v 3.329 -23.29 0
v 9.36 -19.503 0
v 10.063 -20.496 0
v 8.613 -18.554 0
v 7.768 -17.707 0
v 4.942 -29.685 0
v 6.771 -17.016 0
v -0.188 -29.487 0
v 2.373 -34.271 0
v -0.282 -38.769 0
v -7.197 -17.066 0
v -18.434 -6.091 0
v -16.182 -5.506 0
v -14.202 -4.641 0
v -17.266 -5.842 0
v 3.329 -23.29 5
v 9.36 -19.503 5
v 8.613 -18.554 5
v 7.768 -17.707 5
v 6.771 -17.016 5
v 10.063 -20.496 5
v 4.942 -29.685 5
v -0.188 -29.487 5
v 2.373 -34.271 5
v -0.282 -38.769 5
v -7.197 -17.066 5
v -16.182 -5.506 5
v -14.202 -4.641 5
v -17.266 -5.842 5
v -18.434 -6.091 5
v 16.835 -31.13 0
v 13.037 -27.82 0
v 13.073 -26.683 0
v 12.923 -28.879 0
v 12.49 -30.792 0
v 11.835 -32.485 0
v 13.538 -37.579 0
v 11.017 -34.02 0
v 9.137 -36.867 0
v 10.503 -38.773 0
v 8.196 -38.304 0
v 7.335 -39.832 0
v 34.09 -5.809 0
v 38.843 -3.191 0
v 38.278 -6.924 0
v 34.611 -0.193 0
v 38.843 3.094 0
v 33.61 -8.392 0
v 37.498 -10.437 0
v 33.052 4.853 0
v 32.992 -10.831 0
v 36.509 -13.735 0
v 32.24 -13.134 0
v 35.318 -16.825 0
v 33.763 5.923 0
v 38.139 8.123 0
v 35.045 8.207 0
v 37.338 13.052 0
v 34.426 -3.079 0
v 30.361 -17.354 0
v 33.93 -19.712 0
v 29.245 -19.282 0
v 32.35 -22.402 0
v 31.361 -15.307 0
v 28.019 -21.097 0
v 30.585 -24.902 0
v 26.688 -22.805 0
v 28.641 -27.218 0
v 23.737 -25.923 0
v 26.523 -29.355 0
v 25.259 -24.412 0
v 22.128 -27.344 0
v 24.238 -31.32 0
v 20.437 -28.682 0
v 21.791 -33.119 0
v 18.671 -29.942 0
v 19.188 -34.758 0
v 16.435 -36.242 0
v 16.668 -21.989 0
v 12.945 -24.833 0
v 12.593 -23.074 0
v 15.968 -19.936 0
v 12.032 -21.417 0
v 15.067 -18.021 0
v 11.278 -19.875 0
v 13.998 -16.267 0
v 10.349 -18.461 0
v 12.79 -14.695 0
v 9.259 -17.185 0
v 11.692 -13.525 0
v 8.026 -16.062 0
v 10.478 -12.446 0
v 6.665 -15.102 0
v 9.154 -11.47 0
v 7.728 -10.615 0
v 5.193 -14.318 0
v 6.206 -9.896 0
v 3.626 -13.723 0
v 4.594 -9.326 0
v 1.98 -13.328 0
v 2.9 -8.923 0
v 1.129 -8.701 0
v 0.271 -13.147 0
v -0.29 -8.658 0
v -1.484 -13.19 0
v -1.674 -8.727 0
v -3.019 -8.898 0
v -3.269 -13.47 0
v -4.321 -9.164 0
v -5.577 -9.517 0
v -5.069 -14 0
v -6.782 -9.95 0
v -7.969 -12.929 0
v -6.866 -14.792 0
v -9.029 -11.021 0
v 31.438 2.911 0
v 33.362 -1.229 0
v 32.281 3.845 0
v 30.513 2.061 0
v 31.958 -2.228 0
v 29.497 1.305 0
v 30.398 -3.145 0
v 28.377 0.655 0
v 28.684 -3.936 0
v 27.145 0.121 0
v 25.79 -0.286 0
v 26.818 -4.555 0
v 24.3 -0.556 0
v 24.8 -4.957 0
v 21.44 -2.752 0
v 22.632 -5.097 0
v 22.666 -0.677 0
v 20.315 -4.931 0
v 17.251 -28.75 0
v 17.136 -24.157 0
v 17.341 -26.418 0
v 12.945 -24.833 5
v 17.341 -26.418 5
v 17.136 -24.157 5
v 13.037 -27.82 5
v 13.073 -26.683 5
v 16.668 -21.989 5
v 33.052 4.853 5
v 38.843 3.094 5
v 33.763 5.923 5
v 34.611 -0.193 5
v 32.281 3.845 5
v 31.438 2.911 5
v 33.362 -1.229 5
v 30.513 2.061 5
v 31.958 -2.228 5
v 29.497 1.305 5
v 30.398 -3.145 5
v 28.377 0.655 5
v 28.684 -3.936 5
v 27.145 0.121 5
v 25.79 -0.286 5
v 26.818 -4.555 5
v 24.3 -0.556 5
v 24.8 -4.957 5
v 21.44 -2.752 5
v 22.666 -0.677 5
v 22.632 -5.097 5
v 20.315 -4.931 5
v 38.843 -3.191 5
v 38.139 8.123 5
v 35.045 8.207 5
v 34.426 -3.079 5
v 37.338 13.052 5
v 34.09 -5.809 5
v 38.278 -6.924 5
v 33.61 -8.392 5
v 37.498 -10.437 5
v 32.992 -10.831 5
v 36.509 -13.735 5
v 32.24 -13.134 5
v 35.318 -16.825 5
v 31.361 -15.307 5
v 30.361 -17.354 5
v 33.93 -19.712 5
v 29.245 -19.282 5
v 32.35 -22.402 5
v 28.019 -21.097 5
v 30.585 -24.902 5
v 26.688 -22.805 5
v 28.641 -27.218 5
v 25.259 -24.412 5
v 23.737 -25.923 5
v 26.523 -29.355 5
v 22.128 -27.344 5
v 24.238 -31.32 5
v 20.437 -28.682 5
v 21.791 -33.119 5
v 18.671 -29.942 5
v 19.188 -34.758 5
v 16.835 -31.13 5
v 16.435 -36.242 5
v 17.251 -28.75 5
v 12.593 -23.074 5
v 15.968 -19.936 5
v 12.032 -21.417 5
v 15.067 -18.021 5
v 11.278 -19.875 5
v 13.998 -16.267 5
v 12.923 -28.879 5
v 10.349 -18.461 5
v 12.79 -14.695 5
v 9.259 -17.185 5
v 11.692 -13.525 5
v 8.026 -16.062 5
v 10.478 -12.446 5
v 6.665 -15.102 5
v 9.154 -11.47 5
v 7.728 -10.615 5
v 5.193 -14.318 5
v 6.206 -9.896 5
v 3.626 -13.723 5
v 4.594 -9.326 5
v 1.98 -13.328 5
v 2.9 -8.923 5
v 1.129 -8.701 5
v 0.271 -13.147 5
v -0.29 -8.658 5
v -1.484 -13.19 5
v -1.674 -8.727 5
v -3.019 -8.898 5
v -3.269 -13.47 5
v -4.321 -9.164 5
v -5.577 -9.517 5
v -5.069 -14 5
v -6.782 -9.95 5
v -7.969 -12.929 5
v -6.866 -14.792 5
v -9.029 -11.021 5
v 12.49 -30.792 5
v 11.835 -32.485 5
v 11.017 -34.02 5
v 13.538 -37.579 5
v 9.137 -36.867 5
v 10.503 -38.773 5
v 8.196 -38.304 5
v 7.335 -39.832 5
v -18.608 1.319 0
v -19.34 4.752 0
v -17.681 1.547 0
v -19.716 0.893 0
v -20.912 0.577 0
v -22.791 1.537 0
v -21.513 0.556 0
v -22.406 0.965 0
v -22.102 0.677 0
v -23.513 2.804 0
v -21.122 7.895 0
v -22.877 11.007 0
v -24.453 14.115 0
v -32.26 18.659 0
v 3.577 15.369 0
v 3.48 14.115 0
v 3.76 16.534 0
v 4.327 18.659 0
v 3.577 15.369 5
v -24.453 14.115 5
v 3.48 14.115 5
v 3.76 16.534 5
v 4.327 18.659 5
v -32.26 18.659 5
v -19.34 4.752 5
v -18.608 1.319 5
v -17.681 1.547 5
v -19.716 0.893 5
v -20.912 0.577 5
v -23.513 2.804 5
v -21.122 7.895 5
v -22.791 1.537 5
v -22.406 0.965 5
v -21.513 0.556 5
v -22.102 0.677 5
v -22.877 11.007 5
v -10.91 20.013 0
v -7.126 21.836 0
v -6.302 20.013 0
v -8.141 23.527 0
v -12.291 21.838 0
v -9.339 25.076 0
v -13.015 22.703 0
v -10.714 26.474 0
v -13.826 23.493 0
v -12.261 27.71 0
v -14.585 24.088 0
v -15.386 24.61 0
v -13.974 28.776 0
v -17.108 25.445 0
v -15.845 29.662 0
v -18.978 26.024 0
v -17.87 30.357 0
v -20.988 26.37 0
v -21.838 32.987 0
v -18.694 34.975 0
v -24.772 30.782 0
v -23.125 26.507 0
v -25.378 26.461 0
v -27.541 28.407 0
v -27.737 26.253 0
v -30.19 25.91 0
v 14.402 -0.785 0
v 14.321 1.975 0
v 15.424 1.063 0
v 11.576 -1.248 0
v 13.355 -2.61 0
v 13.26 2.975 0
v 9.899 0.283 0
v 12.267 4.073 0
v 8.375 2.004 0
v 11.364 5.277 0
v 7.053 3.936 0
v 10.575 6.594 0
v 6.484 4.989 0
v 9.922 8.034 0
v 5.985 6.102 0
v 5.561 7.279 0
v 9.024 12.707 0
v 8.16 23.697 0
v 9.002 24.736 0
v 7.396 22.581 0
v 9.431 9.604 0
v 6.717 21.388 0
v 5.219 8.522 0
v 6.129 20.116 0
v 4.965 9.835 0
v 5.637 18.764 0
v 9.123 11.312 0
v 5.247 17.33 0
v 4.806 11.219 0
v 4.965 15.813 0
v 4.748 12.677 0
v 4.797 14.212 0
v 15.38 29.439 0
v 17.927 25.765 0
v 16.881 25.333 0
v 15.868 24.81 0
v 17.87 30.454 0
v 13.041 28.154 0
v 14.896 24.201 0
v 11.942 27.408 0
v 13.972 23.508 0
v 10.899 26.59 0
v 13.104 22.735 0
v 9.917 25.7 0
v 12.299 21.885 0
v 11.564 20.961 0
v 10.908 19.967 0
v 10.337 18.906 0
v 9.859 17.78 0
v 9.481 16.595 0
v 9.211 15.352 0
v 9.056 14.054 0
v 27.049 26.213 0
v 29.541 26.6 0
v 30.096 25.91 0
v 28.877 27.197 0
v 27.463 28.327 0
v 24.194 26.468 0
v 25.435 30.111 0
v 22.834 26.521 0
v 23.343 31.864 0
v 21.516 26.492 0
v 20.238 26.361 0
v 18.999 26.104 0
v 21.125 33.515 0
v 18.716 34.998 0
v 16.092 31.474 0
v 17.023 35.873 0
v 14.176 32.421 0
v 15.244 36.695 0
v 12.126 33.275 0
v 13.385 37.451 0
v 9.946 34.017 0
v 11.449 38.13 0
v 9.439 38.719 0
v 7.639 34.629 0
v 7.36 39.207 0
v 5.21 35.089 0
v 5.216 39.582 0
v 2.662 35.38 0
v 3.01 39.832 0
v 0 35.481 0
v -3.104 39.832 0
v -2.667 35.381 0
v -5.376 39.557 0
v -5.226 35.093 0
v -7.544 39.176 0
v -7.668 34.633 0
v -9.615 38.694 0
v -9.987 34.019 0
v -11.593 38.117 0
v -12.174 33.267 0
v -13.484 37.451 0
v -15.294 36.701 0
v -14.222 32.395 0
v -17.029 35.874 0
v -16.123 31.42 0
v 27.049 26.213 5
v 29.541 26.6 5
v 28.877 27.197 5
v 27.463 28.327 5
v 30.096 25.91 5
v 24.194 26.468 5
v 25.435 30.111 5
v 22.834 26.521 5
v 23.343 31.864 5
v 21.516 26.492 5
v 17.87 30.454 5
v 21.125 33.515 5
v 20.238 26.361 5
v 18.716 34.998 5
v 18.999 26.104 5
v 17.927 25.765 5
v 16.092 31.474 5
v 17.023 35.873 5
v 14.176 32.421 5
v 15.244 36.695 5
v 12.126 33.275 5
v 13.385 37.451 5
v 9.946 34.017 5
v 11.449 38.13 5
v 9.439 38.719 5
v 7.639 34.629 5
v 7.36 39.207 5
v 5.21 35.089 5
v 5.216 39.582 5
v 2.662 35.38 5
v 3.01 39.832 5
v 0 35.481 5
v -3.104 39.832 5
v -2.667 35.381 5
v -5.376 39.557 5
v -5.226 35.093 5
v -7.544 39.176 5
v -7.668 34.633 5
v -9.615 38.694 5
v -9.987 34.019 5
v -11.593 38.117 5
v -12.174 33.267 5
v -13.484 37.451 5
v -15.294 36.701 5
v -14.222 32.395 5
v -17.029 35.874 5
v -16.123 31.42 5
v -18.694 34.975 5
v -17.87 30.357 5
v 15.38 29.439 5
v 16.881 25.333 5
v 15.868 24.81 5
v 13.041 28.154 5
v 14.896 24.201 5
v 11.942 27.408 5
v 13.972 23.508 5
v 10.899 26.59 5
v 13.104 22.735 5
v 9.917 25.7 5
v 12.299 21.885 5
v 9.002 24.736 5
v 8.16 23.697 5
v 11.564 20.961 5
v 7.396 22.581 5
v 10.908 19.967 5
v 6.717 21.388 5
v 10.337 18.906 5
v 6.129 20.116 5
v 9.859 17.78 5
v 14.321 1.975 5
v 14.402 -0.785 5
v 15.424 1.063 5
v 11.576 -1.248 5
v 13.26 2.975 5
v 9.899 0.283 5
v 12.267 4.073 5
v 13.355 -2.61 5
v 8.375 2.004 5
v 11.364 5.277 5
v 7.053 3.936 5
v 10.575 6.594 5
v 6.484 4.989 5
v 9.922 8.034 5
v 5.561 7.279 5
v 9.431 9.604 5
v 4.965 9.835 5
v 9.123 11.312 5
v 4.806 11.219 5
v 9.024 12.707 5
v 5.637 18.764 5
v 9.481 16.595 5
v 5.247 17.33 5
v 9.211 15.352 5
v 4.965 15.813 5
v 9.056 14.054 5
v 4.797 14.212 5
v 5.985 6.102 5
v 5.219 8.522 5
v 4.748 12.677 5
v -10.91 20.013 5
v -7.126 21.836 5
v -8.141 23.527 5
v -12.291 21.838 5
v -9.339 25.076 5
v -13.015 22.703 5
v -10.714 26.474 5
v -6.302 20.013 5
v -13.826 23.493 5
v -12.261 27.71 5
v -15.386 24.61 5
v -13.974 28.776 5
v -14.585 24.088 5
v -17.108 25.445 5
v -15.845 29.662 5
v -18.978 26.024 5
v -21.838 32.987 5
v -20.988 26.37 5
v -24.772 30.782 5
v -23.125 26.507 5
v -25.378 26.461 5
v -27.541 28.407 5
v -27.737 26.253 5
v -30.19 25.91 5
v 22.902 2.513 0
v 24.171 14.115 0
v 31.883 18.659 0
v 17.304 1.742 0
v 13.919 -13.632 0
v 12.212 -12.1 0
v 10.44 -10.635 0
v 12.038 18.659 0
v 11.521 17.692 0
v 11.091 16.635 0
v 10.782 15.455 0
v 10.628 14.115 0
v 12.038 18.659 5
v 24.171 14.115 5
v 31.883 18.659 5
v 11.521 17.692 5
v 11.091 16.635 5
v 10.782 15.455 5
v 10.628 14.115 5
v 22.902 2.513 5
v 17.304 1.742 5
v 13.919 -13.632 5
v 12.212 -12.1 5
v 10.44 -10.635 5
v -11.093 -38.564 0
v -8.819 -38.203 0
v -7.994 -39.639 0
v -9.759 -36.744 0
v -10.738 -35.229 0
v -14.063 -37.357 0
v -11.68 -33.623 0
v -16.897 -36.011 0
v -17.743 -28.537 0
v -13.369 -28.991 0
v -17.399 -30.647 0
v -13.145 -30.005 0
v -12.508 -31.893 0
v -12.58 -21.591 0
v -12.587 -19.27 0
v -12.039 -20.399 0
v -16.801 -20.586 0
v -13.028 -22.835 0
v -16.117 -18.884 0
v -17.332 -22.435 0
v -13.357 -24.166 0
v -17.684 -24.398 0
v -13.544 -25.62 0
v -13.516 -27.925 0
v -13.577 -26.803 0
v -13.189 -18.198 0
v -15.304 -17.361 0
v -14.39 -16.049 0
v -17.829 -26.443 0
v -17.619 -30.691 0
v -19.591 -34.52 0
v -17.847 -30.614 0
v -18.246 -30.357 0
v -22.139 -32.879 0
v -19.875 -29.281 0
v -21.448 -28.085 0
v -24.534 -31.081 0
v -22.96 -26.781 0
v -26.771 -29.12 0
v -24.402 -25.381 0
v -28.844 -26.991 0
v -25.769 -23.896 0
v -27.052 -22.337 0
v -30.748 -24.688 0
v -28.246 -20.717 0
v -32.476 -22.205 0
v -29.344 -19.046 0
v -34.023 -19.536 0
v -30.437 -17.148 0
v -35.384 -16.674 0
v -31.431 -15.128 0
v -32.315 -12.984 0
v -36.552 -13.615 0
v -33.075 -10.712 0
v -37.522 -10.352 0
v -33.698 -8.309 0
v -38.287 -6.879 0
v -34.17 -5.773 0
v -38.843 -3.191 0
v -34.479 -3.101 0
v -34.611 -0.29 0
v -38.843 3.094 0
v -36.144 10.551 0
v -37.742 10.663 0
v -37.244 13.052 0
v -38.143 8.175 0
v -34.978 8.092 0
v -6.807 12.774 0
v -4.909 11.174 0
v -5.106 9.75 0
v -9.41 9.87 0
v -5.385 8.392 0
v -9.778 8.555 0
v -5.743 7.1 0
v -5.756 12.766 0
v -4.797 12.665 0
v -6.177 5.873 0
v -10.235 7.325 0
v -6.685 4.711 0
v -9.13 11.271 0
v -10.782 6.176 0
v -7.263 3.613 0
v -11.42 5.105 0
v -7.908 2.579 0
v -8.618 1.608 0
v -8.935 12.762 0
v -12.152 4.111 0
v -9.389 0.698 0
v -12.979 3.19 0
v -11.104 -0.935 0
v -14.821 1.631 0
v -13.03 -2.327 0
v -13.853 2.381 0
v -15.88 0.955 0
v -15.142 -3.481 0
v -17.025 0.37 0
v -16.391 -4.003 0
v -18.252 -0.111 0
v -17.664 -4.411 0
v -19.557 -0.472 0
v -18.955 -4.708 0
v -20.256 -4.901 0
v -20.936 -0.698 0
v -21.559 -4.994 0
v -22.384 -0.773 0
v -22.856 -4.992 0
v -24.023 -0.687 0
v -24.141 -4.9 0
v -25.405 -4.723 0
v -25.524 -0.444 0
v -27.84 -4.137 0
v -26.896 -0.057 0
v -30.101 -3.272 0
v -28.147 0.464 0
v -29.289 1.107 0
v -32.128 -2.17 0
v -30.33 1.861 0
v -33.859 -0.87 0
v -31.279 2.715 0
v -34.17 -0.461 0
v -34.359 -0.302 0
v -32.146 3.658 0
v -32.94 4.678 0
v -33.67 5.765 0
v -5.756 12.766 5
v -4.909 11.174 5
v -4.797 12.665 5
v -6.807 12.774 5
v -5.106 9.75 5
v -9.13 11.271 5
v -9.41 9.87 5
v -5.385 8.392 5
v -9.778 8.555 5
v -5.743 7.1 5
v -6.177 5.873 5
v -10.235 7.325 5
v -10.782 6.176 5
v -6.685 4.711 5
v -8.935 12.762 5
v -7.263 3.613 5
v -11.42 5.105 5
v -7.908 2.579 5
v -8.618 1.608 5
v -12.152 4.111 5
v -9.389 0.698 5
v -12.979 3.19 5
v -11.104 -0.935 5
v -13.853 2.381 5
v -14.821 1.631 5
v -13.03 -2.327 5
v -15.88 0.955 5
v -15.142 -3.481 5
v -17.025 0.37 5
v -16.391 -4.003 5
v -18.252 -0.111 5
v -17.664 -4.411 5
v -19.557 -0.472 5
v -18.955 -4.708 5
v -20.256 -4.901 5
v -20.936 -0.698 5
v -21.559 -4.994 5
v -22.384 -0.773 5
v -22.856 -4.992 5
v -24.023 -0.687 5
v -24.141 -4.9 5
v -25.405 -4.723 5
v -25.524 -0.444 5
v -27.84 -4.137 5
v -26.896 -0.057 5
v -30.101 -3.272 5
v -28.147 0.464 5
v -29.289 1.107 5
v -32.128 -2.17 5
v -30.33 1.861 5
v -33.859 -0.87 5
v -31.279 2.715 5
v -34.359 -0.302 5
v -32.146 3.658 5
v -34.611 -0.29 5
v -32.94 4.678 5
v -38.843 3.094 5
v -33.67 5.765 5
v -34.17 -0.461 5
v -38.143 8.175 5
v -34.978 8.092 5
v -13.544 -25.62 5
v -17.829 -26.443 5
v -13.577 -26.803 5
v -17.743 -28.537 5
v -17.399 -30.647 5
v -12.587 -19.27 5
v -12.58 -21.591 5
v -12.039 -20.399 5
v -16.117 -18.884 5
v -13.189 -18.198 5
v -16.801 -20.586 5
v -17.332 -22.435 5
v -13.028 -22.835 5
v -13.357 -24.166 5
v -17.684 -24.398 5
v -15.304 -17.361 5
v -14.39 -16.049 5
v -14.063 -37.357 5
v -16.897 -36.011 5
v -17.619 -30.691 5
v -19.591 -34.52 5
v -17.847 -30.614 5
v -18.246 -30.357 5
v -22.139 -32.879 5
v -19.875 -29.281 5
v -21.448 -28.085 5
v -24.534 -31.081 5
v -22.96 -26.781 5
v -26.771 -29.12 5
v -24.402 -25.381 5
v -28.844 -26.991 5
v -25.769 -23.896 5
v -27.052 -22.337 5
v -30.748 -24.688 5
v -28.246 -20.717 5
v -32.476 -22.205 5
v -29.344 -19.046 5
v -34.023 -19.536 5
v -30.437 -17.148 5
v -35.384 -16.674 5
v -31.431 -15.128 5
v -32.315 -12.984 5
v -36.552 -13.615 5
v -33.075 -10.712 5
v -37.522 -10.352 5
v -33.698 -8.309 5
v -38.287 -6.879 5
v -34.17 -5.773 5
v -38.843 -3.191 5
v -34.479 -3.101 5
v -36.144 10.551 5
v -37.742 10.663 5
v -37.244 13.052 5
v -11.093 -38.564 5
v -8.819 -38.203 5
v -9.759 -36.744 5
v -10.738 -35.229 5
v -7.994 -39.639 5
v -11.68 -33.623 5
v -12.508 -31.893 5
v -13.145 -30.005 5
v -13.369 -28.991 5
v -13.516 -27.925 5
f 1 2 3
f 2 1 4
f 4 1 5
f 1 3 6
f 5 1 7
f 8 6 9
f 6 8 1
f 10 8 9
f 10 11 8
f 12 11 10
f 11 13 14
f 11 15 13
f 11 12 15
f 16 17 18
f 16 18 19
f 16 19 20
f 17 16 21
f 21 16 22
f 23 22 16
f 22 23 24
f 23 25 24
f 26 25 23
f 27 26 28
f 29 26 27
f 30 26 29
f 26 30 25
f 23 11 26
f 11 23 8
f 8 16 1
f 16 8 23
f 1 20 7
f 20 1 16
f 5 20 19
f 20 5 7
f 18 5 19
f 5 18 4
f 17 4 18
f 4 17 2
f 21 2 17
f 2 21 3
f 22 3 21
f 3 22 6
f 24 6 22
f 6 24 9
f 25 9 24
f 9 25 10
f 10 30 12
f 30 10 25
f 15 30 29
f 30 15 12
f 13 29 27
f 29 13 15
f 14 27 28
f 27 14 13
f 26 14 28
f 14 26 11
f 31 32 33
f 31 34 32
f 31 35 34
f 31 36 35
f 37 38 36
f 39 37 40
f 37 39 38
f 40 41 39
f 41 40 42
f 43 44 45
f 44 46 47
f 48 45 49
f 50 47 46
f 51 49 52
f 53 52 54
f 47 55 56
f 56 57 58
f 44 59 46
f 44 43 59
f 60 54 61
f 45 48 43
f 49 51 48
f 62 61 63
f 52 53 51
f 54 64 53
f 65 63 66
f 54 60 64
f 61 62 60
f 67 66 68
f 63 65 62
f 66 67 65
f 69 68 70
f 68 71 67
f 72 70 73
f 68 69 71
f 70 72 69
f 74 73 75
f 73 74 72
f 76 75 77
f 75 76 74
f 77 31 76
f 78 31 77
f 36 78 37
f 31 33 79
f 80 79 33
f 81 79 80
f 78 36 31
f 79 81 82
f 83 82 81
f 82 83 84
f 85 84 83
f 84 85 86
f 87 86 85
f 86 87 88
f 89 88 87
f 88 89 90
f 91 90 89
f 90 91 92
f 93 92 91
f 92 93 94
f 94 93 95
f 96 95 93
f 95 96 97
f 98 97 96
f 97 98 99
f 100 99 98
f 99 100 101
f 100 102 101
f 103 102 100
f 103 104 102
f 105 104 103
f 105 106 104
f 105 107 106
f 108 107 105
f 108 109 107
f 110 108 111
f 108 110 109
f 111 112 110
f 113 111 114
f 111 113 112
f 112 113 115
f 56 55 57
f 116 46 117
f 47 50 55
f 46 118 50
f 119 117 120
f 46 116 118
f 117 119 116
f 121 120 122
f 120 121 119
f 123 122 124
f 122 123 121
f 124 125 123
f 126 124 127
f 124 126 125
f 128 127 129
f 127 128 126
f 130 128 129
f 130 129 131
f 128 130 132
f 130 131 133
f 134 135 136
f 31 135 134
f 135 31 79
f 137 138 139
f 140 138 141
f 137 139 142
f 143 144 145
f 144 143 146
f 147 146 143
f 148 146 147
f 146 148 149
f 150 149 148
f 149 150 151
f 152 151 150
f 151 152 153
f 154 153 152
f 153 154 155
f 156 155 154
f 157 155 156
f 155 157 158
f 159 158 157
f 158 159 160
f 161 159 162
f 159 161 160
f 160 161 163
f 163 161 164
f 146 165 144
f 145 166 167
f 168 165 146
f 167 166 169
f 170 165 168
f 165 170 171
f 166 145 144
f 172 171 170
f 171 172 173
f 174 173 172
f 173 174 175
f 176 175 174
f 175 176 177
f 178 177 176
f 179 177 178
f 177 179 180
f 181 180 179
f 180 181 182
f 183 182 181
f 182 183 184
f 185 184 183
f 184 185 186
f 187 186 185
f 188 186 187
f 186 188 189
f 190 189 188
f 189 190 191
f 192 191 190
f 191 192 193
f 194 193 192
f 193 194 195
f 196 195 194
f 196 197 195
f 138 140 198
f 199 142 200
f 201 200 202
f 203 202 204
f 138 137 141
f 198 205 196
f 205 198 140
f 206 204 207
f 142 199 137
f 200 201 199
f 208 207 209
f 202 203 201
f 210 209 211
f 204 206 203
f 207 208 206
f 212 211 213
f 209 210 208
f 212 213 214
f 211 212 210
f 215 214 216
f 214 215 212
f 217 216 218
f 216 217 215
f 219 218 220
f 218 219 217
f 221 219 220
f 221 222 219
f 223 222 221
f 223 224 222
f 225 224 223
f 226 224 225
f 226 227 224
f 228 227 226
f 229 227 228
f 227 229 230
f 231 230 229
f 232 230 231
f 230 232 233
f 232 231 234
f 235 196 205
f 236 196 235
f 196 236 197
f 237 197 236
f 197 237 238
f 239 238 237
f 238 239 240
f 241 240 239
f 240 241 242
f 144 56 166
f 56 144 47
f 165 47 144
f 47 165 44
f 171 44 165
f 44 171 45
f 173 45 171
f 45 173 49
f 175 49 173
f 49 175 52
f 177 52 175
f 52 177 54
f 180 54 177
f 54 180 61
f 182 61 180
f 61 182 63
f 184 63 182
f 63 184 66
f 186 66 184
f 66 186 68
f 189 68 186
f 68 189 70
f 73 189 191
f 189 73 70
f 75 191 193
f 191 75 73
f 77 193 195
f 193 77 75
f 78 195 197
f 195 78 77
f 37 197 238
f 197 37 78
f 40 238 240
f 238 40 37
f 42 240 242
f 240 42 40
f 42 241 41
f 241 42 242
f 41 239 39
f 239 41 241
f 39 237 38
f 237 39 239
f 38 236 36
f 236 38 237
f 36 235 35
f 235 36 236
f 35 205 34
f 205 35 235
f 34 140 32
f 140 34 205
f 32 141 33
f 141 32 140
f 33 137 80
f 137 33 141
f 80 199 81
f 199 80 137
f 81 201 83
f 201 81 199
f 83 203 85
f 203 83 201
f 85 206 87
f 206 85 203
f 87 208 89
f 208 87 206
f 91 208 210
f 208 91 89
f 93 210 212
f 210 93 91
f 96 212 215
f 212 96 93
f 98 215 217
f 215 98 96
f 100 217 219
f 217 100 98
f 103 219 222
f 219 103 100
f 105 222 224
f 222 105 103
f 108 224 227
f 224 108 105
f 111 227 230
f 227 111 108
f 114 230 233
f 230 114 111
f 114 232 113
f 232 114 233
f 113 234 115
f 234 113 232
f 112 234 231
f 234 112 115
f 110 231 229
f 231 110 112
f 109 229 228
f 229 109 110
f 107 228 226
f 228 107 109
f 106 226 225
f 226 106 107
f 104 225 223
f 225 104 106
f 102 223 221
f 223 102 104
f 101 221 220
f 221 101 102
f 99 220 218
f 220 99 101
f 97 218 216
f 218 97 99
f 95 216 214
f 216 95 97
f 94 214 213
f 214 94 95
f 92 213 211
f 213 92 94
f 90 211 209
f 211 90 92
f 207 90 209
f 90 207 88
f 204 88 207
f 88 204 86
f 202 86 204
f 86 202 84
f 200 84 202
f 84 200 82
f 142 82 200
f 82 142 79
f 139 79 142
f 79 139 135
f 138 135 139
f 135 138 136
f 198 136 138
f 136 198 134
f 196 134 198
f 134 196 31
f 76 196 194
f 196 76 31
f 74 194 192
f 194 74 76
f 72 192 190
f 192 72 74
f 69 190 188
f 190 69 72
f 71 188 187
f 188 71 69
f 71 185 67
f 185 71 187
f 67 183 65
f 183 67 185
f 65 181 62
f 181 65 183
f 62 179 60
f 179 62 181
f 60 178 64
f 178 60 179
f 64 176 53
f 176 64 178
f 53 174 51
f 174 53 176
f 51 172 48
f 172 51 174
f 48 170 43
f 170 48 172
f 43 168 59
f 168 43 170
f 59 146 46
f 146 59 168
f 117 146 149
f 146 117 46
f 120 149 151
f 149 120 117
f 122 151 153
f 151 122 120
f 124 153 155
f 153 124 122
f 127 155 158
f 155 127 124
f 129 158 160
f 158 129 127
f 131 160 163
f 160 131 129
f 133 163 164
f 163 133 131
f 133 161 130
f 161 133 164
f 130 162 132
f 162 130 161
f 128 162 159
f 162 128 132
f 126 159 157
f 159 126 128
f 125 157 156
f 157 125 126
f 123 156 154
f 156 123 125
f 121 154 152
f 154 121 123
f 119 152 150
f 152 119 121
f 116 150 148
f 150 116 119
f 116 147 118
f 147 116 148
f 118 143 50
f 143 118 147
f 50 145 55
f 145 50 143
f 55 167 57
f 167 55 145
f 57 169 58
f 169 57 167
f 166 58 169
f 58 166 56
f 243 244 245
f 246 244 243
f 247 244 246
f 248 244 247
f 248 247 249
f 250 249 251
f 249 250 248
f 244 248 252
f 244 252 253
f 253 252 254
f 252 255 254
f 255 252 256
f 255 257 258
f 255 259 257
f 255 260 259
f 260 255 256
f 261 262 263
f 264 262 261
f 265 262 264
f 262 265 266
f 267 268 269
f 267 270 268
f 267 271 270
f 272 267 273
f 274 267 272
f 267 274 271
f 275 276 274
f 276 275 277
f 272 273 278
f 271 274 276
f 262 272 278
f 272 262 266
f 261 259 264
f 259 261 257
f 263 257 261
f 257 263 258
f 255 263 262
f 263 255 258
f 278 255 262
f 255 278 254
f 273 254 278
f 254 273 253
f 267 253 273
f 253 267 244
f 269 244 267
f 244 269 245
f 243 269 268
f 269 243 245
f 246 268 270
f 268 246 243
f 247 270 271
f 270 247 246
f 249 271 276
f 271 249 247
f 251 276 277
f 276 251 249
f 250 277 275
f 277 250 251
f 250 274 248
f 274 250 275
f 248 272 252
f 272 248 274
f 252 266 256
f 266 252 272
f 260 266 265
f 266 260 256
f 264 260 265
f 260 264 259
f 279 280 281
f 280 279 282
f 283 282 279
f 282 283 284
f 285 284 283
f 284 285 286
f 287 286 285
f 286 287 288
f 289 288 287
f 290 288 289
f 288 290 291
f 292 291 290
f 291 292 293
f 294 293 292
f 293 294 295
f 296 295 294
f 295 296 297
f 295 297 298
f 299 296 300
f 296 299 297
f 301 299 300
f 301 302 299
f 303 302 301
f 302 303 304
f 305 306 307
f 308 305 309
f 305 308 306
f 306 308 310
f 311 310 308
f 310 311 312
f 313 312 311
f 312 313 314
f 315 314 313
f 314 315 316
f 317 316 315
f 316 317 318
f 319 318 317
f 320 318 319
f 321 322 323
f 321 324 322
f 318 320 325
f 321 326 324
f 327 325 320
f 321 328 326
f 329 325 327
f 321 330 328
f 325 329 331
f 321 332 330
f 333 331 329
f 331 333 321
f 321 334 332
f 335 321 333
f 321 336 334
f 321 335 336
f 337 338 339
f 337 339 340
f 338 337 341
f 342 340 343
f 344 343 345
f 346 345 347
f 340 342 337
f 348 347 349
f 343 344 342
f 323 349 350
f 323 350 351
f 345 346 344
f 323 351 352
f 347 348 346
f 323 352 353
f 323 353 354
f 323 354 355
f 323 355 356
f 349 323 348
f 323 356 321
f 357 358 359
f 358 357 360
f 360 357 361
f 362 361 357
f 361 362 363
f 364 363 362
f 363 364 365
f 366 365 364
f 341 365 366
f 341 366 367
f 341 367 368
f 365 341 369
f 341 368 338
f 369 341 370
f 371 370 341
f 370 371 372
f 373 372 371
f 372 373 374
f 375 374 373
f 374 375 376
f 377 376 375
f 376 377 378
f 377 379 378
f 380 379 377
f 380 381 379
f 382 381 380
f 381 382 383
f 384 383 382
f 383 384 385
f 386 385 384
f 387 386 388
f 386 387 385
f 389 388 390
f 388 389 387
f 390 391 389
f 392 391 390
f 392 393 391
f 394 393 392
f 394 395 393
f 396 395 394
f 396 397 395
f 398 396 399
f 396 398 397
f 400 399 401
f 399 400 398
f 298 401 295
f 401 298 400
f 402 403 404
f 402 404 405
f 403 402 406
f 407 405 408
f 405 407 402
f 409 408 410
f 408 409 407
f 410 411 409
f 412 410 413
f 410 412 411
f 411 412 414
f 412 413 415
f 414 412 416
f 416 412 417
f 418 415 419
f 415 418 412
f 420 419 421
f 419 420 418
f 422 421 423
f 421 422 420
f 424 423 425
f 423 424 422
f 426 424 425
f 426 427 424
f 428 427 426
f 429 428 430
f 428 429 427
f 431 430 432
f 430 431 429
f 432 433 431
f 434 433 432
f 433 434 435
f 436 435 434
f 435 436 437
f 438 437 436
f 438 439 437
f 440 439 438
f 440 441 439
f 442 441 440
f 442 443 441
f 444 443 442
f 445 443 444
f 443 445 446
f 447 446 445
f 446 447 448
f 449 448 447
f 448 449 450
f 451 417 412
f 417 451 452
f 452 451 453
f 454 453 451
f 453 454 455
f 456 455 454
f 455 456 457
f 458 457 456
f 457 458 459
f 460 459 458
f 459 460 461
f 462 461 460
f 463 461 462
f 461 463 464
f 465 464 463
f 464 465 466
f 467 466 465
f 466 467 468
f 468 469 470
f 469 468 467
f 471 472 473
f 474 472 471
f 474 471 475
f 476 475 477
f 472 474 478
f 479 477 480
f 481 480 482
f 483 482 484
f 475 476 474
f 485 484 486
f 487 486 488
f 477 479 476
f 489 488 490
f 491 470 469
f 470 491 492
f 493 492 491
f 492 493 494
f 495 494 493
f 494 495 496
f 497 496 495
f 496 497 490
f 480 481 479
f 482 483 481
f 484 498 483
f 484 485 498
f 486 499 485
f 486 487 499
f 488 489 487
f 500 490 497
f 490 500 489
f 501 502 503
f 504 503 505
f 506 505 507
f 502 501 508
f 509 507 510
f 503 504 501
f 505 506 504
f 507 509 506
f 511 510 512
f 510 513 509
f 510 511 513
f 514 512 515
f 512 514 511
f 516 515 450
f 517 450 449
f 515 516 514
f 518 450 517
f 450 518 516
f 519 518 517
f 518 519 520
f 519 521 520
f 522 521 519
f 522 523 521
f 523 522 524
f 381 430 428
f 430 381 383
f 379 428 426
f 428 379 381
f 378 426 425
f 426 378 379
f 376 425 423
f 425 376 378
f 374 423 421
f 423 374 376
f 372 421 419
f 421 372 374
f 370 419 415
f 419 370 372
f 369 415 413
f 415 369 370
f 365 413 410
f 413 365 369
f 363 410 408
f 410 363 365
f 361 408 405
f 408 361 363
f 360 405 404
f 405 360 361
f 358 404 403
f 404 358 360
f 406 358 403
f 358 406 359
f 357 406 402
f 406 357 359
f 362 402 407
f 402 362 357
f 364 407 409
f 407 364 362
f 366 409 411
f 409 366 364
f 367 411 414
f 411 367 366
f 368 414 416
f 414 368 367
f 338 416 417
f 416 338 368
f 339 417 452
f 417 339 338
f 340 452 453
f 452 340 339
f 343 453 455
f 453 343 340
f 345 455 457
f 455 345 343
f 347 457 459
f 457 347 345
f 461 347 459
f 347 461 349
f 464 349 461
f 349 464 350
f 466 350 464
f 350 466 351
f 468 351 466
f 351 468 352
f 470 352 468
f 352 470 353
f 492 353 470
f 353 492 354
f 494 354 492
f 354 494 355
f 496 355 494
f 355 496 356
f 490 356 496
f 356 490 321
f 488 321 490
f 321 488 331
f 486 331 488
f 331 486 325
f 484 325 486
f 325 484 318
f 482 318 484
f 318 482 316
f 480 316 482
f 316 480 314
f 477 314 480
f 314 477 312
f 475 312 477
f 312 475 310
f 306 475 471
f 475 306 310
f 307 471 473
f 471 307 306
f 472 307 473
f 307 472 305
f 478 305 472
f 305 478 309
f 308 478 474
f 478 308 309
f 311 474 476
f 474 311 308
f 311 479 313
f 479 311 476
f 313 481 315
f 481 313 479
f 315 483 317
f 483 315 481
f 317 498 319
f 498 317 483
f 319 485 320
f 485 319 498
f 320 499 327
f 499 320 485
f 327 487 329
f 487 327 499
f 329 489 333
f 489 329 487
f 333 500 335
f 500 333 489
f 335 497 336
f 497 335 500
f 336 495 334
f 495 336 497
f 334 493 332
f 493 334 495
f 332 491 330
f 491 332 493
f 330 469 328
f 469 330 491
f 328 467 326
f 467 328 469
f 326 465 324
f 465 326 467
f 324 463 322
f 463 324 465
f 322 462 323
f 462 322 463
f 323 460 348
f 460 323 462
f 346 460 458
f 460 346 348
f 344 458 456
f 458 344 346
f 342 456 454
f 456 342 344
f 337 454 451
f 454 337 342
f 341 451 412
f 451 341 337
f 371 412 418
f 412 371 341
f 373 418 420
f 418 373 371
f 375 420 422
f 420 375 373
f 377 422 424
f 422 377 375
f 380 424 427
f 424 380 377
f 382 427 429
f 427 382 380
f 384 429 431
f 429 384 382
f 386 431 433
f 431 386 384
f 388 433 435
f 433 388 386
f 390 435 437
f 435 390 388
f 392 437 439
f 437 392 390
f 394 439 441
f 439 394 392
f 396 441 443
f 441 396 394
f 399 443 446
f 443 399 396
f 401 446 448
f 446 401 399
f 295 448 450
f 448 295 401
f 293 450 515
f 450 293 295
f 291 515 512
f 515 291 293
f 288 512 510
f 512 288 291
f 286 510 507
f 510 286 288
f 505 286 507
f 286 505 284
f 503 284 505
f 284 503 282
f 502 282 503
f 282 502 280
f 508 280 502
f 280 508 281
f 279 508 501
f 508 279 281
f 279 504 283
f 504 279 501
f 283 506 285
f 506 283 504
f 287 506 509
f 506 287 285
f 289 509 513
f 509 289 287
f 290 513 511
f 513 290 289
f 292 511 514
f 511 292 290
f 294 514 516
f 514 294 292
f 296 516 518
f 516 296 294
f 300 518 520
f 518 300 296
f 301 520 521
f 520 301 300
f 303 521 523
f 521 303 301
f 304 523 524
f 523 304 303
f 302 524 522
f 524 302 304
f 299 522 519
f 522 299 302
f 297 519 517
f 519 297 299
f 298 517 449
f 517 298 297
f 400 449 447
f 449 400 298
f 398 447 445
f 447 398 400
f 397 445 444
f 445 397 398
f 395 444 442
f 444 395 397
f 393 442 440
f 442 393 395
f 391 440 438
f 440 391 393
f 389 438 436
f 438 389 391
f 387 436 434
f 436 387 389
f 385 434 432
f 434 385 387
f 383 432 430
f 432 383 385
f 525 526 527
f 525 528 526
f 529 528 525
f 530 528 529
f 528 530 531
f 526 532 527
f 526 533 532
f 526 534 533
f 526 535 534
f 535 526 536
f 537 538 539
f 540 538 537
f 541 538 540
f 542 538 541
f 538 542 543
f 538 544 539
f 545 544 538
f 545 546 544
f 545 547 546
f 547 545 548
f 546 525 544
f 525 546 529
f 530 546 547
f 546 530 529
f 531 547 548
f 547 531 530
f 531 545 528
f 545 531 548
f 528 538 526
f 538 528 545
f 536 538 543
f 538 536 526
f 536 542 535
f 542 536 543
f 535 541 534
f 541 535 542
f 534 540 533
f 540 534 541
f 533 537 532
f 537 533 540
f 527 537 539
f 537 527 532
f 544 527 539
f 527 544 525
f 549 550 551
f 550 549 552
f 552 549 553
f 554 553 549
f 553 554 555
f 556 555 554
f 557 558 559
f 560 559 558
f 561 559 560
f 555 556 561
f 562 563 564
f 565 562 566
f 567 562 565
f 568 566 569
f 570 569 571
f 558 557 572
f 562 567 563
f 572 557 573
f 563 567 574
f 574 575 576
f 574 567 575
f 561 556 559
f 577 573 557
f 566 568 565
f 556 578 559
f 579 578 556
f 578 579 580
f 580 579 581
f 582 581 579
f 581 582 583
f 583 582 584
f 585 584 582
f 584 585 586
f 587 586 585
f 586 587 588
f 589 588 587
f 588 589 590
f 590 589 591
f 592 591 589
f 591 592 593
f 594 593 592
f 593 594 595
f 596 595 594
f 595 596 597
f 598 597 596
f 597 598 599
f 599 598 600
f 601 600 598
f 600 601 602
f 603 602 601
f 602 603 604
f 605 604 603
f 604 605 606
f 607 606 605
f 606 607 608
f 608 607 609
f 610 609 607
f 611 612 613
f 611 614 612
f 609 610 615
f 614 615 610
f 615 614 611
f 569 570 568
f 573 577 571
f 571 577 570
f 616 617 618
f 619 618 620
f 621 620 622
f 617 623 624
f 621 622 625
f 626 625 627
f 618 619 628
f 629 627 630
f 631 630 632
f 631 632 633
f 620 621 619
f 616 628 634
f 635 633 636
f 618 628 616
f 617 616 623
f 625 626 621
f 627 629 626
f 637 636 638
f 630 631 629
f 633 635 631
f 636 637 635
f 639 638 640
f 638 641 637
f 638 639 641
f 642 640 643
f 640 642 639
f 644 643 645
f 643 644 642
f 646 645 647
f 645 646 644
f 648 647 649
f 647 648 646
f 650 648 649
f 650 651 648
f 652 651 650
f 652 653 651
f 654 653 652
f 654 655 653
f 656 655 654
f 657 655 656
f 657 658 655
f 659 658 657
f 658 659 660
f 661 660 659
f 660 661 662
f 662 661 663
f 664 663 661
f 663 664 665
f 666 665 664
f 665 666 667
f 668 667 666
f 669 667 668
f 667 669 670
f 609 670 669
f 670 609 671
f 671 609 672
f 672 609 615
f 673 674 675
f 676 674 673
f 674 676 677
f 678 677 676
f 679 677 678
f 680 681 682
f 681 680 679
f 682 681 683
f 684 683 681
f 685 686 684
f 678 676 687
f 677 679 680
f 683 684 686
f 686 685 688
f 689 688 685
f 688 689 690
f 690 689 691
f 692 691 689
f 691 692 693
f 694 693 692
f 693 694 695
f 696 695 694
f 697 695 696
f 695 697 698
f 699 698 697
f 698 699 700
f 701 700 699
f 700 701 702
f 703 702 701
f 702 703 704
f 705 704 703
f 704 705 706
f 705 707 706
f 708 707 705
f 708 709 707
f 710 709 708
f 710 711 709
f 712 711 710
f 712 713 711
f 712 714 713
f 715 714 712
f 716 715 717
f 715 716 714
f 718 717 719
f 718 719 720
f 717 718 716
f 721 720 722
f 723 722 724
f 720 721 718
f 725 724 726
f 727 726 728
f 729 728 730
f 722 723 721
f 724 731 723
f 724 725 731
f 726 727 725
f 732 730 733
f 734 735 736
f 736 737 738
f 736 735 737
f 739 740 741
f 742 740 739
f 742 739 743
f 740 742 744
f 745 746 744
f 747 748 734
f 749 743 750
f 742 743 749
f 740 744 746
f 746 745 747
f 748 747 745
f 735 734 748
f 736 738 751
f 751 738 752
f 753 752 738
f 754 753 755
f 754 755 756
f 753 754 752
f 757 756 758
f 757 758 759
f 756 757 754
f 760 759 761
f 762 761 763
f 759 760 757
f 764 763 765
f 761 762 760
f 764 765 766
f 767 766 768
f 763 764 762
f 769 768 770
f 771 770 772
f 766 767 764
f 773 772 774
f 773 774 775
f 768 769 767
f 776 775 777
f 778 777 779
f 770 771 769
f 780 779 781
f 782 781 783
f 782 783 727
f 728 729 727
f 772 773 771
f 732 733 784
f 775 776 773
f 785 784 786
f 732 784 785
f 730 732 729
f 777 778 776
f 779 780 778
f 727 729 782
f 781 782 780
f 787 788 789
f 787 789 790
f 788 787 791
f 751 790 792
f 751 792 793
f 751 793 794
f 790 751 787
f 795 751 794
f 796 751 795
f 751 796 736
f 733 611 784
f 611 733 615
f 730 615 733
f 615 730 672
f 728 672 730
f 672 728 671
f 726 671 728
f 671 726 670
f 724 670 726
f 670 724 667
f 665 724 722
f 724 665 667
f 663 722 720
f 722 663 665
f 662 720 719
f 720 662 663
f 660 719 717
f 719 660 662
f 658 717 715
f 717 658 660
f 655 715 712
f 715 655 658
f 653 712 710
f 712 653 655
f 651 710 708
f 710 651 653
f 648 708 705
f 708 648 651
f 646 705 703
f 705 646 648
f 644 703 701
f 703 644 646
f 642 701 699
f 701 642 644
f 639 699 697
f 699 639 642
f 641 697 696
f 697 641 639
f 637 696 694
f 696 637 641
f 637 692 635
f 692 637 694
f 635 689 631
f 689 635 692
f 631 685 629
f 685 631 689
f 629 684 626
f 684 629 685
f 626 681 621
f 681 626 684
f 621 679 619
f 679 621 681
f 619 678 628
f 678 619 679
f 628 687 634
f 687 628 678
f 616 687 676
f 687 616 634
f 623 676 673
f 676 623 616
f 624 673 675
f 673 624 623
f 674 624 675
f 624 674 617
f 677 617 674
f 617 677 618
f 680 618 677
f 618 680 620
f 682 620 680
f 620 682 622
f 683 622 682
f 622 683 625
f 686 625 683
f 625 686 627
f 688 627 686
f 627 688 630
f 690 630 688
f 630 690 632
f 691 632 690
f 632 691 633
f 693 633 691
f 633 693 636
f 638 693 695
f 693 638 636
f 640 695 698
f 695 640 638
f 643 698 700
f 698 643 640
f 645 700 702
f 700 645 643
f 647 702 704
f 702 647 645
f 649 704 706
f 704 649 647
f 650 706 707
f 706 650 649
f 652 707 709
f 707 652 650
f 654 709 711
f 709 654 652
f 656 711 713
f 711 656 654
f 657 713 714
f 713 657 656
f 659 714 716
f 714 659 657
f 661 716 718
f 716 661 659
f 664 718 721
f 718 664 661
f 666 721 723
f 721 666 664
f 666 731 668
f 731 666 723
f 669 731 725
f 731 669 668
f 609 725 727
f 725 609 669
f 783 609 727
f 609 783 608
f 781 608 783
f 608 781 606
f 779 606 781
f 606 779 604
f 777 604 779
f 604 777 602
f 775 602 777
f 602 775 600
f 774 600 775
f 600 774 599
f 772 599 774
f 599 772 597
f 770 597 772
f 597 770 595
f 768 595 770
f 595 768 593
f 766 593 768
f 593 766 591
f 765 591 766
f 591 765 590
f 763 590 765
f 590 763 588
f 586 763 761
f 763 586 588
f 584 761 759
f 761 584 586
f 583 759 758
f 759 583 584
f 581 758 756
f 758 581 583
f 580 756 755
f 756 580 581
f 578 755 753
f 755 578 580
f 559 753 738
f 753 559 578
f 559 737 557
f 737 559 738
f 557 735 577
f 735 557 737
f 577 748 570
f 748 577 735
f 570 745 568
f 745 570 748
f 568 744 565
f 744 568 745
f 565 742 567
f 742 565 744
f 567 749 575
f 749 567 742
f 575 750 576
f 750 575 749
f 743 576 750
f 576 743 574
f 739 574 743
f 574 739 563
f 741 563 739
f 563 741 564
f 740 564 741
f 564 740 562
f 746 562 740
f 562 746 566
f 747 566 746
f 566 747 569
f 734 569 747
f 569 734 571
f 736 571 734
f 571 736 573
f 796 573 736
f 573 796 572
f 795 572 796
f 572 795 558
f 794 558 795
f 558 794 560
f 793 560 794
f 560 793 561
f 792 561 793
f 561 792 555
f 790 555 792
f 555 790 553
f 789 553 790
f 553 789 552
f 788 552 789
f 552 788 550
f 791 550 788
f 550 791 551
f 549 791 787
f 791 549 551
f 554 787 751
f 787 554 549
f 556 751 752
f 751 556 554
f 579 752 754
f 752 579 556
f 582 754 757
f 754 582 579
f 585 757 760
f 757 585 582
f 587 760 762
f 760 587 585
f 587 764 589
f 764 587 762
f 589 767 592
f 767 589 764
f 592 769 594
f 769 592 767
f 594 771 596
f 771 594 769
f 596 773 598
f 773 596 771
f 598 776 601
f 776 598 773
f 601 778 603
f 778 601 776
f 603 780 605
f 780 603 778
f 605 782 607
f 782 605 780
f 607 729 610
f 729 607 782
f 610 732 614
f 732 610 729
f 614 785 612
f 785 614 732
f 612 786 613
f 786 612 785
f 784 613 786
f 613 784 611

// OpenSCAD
// Module names are of the form poly_<inkscape-path-id>().  As a result,
// you can associate a polygon in this OpenSCAD program with the corresponding
// SVG element in the Inkscape document by looking for the XML element with
// the attribute id="inkscape-path-id".

// fudge value is used to ensure that subtracted solids are a tad taller
// in the z dimension than the polygon being subtracted from.  This helps
// keep the resulting .stl file manifold.
fudge = 0.1;

module poly_path3036(h)
{
  scale([25.4/90, -25.4/90, 1]) union()
  {
    linear_extrude(height=h)
      polygon([[-0.666875,104.480767],[11.794844,82.523002],[23.993125,60.291767],[27.524883,62.741301],[30.518750,65.744064],[33.165742,69.103805],[35.656875,72.624267],[17.511562,105.183441],[8.409375,121.433611],[-0.999375,137.369405],[-65.317750,21.582767],[-61.177506,20.698982],[-57.337016,19.508236],[-50.321625,16.444268],[-25.499687,60.469033]]);
  }
}

module poly_path3034(h)
{
  scale([25.4/90, -25.4/90, 1]) union()
  {
    linear_extrude(height=h)
      polygon([[137.633125,-10.961982],[137.633125,11.305518],[135.630390,24.534409],[132.867161,36.981276],[129.364262,48.667568],[125.142520,59.614736],[120.222757,69.844229],[114.625798,79.377499],[108.372469,88.235996],[101.483594,96.441169],[93.979997,104.014471],[85.882502,110.977350],[77.211936,117.351257],[67.989121,123.157643],[58.234883,128.417959],[47.970046,133.153653],[37.215435,137.386178],[25.991875,141.136983],[29.040745,135.721415],[32.374160,130.631741],[39.035469,120.545013],[41.933782,115.105431],[44.257480,109.106685],[45.791775,102.327510],[46.195774,98.576117],[46.321875,94.546642],[45.869334,87.991748],[44.620320,81.757431],[42.632274,75.887038],[39.962639,70.423916],[36.668856,65.411412],[32.808368,60.892874],[28.438618,56.911648],[23.617047,53.511080],[18.401097,50.734518],[12.848212,48.625309],[7.015832,47.226800],[0.961400,46.582338],[-5.257641,46.735269],[-11.583849,47.728940],[-17.959783,49.606699],[-24.328000,52.411893],[-28.237062,45.810846],[-31.992000,39.050517],[-24.032057,35.255600],[-19.759969,33.722979],[-15.310547,32.470955],[-10.696845,31.527556],[-5.931920,30.920810],[-1.028828,30.678747],[3.999375,30.829393],[10.274106,31.617179],[16.278398,33.046555],[21.988960,35.063446],[27.382500,37.613783],[32.435728,40.643493],[37.125352,44.098504],[41.428081,47.924744],[45.320625,52.068143],[49.597681,57.637656],[53.387383,63.854428],[56.578315,70.639120],[59.059063,77.912393],[60.718208,85.594908],[61.444336,93.607326],[61.126030,101.870309],[59.651875,110.304517],[66.157920,106.094672],[72.416113,101.630022],[78.406152,96.889702],[84.107734,91.852846],[89.500557,86.498587],[94.564316,80.806059],[99.278711,74.754398],[103.623437,68.322736],[107.578193,61.490208],[111.122676,54.235948],[114.236582,46.539090],[116.899609,38.378767],[119.091455,29.734115],[120.791816,20.584267],[121.980391,10.908356],[122.636875,0.685517],[118.212947,4.354544],[113.235293,7.893976],[107.708235,11.144223],[101.636094,13.945689],[95.023191,16.138783],[87.873848,17.563910],[80.192385,18.061478],[71.983125,17.471892],[75.969688,9.751158],[80.314375,2.398018],[86.103115,1.968537],[91.380566,1.013425],[96.183730,-0.429278],[100.549609,-2.321533],[104.515205,-4.625299],[108.117520,-7.302537],[111.393555,-10.315205],[114.380313,-13.625264],[117.114795,-17.194673],[119.634004,-20.985393],[124.174609,-29.078604],[132.300625,-46.246983],[135.139844,-28.782607]]);
  }
}

module poly_path3028(h)
{
  scale([25.4/90, -25.4/90, 1]) union()
  {
    linear_extrude(height=h)
      polygon([[-114.306000,-66.114483],[15.330625,-66.114483],[13.324375,-58.585264],[12.674219,-54.457549],[12.330625,-50.014482],[-86.646250,-50.014482],[-81.061762,-39.000479],[-74.843125,-27.975576],[-68.527176,-16.837002],[-62.650750,-5.481983],[-65.934328,-4.672842],[-69.859906,-3.165733],[-74.096781,-2.045811],[-76.228610,-1.970156],[-78.314250,-2.398233],[-79.390893,-3.417744],[-80.754516,-5.444951],[-83.313750,-9.934482]]);
  }
}

module poly_path3026(h)
{
  scale([25.4/90, -25.4/90, 1]) union()
  {
    linear_extrude(height=h)
      polygon([[-10.996875,-141.136982],[10.664375,-141.136982],[18.481804,-140.252095],[26.080371,-138.923975],[33.446526,-137.194780],[40.566719,-135.106670],[47.427400,-132.701802],[54.015020,-130.022334],[60.316028,-127.110425],[66.316875,-124.008232],[74.852246,-118.755713],[82.712969,-112.903076],[90.123457,-106.693955],[97.308125,-100.371982],[102.319687,-96.368076],[104.671250,-94.251455],[106.639375,-91.808232],[95.842500,-92.881709],[85.728125,-93.784795],[80.909004,-93.970366],[76.239062,-93.870850],[71.711152,-93.405415],[67.318125,-92.493232],[63.519628,-91.293199],[59.812825,-89.761968],[56.224106,-87.911203],[52.779863,-85.752568],[49.506487,-83.297728],[46.430369,-80.558345],[43.577899,-77.546083],[40.975469,-74.272607],[38.649469,-70.749581],[36.626292,-66.988667],[34.932326,-63.001530],[33.593965,-58.799834],[32.637598,-54.395242],[32.089617,-49.799419],[31.976412,-45.024028],[32.324375,-40.080732],[33.415525,-34.028552],[35.158105,-28.466729],[37.469250,-23.366243],[40.266094,-18.698076],[43.465769,-14.433211],[46.985410,-10.542627],[50.742151,-6.997307],[54.653125,-3.768232],[51.029063,2.783174],[47.320625,9.249267],[41.017026,4.422715],[35.075977,-1.001670],[29.675220,-7.099883],[24.992500,-13.947920],[22.975949,-17.676871],[21.205562,-21.621777],[19.703555,-25.792138],[18.492148,-30.197451],[17.593559,-34.847218],[17.030005,-39.750938],[16.823704,-44.918109],[16.996875,-50.358232],[17.591723,-56.030297],[18.590364,-61.404375],[19.971992,-66.485031],[21.715801,-71.276826],[23.800984,-75.784325],[26.206736,-80.012090],[28.912249,-83.964684],[31.896719,-87.646670],[35.139337,-91.062611],[38.619299,-94.217070],[42.315798,-97.114611],[46.208027,-99.759795],[54.496453,-104.311348],[63.318125,-107.908232],[57.019143,-111.521379],[50.230801,-114.875908],[42.966941,-117.903045],[35.241406,-120.534014],[27.068040,-122.700042],[18.460684,-124.332354],[9.433181,-125.362175],[-0.000625,-125.720732],[-9.450973,-125.366838],[-18.517021,-124.345283],[-27.171539,-122.716257],[-35.387297,-120.539951],[-43.137064,-117.876555],[-50.393611,-114.786260],[-57.129708,-111.329255],[-63.318125,-107.565732],[-56.144420,-105.100315],[-49.513139,-101.962315],[-43.445925,-98.185671],[-37.964422,-93.804326],[-33.090272,-88.852219],[-28.845119,-83.363291],[-25.250606,-77.371482],[-22.328375,-70.910732],[-38.657000,-70.910732],[-43.551078,-77.380420],[-46.117877,-80.441943],[-48.988625,-83.244483],[-51.680310,-85.352213],[-54.519001,-87.200349],[-60.617953,-90.160635],[-67.246593,-92.210930],[-74.366031,-93.436826],[-81.937380,-93.923914],[-89.921750,-93.757783],[-98.280253,-93.024026],[-106.974000,-91.808233],[-97.585868,-100.655671],[-87.774768,-109.068682],[-77.379467,-116.881428],[-66.238734,-123.928076],[-60.338447,-127.112290],[-54.191340,-130.042791],[-47.777260,-132.698849],[-41.076053,-135.059736],[-34.067564,-137.104723],[-26.731641,-138.813079],[-19.048129,-140.164075]]);
  }
}

module poly_path3030(h)
{
  scale([25.4/90, -25.4/90, 1]) union()
  {
    linear_extrude(height=h)
      polygon([[42.654375,-66.114483],[112.970625,-66.114483],[81.149375,-8.904514],[49.320625,48.301517],[43.270469,42.874892],[36.990625,37.681893],[61.311875,-6.173842],[85.644375,-50.014482],[37.656875,-50.014482],[38.203945,-54.760947],[39.299687,-58.944326],[40.823398,-62.687783],[42.654375,-66.114483]]);
  }
}

module poly_path3032(h)
{
  scale([25.4/90, -25.4/90, 1]) union()
  {
    linear_extrude(height=h)
      polygon([[-137.633125,11.305517],[-137.633125,-10.961983],[-135.153144,-28.967295],[-133.731330,-37.783037],[-131.967113,-46.246983],[-128.070622,-37.386316],[-123.937817,-28.673525],[-119.303276,-20.425706],[-116.714910,-16.575252],[-113.901577,-12.959951],[-110.830098,-9.619441],[-107.467296,-6.593357],[-103.779994,-3.921337],[-99.735013,-1.643018],[-95.299176,0.201964],[-90.439305,1.573972],[-85.122223,2.433369],[-79.314750,2.740518],[-74.182785,2.472222],[-69.297174,1.672041],[-64.672776,0.393442],[-60.324453,-1.310108],[-56.267066,-3.385142],[-52.515475,-5.778193],[-49.084541,-8.435796],[-45.989125,-11.304483],[-43.059778,-14.566712],[-40.466062,-18.089580],[-38.202745,-21.882361],[-36.264594,-25.954326],[-34.646376,-30.314749],[-33.342859,-34.972900],[-32.348812,-39.938054],[-31.659000,-45.219483],[-24.119141,-45.261983],[-20.396432,-45.234951],[-16.996375,-44.876983],[-17.393029,-39.592929],[-18.090974,-34.546406],[-19.079773,-29.735328],[-20.348992,-25.157608],[-21.888197,-20.811156],[-23.686952,-16.693887],[-25.734823,-12.803712],[-28.021375,-9.138545],[-30.536173,-5.696298],[-33.268782,-2.474883],[-39.345695,3.313799],[-46.168636,8.244199],[-53.654125,12.333017],[-58.077972,14.184372],[-62.590429,15.628193],[-67.164537,16.682395],[-71.773336,17.364892],[-76.389867,17.693601],[-80.987169,17.686435],[-85.538283,17.361311],[-90.016250,16.736143],[-98.644901,14.657334],[-106.657445,11.593330],[-113.838204,7.687451],[-119.971500,3.083017],[-121.073781,1.634580],[-121.743305,1.068916],[-122.636000,1.028017],[-122.168713,10.989222],[-121.075166,20.457215],[-119.402001,29.442316],[-117.195859,37.954846],[-114.503384,46.005123],[-111.371217,53.603469],[-107.846000,60.760202],[-103.974375,67.485642],[-100.085898,73.405777],[-95.855041,79.147418],[-91.306293,84.669769],[-86.464141,89.932033],[-81.353073,94.893412],[-75.997576,99.513109],[-70.422139,103.750327],[-64.651250,107.564268],[-63.238578,108.475955],[-62.430975,108.748119],[-61.651250,108.591518],[-62.869095,101.114112],[-63.174178,93.695609],[-62.658488,86.451080],[-61.414016,79.495596],[-59.532753,72.944226],[-57.106689,66.912043],[-54.227817,61.514116],[-50.988125,56.865518],[-46.732797,64.480205],[-44.598002,68.280787],[-42.656625,72.280517],[-44.576350,76.504969],[-46.162922,80.912408],[-47.329471,85.628309],[-47.989125,90.778142],[-48.108915,94.969852],[-47.890981,98.946826],[-47.369158,102.724020],[-46.577279,106.316387],[-44.318692,113.006463],[-41.385891,119.136693],[-38.049549,124.826716],[-34.580338,130.196169],[-31.248931,135.364692],[-28.326000,140.451924],[-39.306299,136.645166],[-49.828615,132.367449],[-59.872556,127.597837],[-69.417730,122.315398],[-78.443745,116.499196],[-86.930208,110.128299],[-94.856725,103.181770],[-102.202906,95.638678],[-108.948358,87.478086],[-115.072687,78.679062],[-120.555502,69.220671],[-125.376410,59.081979],[-129.515019,48.242052],[-132.950936,36.679955],[-135.663769,24.374755]]);
  }
}

poly_path3036(5);
poly_path3034(5);
poly_path3028(5);
poly_path3026(5);
poly_path3030(5);
poly_path3032(5);
